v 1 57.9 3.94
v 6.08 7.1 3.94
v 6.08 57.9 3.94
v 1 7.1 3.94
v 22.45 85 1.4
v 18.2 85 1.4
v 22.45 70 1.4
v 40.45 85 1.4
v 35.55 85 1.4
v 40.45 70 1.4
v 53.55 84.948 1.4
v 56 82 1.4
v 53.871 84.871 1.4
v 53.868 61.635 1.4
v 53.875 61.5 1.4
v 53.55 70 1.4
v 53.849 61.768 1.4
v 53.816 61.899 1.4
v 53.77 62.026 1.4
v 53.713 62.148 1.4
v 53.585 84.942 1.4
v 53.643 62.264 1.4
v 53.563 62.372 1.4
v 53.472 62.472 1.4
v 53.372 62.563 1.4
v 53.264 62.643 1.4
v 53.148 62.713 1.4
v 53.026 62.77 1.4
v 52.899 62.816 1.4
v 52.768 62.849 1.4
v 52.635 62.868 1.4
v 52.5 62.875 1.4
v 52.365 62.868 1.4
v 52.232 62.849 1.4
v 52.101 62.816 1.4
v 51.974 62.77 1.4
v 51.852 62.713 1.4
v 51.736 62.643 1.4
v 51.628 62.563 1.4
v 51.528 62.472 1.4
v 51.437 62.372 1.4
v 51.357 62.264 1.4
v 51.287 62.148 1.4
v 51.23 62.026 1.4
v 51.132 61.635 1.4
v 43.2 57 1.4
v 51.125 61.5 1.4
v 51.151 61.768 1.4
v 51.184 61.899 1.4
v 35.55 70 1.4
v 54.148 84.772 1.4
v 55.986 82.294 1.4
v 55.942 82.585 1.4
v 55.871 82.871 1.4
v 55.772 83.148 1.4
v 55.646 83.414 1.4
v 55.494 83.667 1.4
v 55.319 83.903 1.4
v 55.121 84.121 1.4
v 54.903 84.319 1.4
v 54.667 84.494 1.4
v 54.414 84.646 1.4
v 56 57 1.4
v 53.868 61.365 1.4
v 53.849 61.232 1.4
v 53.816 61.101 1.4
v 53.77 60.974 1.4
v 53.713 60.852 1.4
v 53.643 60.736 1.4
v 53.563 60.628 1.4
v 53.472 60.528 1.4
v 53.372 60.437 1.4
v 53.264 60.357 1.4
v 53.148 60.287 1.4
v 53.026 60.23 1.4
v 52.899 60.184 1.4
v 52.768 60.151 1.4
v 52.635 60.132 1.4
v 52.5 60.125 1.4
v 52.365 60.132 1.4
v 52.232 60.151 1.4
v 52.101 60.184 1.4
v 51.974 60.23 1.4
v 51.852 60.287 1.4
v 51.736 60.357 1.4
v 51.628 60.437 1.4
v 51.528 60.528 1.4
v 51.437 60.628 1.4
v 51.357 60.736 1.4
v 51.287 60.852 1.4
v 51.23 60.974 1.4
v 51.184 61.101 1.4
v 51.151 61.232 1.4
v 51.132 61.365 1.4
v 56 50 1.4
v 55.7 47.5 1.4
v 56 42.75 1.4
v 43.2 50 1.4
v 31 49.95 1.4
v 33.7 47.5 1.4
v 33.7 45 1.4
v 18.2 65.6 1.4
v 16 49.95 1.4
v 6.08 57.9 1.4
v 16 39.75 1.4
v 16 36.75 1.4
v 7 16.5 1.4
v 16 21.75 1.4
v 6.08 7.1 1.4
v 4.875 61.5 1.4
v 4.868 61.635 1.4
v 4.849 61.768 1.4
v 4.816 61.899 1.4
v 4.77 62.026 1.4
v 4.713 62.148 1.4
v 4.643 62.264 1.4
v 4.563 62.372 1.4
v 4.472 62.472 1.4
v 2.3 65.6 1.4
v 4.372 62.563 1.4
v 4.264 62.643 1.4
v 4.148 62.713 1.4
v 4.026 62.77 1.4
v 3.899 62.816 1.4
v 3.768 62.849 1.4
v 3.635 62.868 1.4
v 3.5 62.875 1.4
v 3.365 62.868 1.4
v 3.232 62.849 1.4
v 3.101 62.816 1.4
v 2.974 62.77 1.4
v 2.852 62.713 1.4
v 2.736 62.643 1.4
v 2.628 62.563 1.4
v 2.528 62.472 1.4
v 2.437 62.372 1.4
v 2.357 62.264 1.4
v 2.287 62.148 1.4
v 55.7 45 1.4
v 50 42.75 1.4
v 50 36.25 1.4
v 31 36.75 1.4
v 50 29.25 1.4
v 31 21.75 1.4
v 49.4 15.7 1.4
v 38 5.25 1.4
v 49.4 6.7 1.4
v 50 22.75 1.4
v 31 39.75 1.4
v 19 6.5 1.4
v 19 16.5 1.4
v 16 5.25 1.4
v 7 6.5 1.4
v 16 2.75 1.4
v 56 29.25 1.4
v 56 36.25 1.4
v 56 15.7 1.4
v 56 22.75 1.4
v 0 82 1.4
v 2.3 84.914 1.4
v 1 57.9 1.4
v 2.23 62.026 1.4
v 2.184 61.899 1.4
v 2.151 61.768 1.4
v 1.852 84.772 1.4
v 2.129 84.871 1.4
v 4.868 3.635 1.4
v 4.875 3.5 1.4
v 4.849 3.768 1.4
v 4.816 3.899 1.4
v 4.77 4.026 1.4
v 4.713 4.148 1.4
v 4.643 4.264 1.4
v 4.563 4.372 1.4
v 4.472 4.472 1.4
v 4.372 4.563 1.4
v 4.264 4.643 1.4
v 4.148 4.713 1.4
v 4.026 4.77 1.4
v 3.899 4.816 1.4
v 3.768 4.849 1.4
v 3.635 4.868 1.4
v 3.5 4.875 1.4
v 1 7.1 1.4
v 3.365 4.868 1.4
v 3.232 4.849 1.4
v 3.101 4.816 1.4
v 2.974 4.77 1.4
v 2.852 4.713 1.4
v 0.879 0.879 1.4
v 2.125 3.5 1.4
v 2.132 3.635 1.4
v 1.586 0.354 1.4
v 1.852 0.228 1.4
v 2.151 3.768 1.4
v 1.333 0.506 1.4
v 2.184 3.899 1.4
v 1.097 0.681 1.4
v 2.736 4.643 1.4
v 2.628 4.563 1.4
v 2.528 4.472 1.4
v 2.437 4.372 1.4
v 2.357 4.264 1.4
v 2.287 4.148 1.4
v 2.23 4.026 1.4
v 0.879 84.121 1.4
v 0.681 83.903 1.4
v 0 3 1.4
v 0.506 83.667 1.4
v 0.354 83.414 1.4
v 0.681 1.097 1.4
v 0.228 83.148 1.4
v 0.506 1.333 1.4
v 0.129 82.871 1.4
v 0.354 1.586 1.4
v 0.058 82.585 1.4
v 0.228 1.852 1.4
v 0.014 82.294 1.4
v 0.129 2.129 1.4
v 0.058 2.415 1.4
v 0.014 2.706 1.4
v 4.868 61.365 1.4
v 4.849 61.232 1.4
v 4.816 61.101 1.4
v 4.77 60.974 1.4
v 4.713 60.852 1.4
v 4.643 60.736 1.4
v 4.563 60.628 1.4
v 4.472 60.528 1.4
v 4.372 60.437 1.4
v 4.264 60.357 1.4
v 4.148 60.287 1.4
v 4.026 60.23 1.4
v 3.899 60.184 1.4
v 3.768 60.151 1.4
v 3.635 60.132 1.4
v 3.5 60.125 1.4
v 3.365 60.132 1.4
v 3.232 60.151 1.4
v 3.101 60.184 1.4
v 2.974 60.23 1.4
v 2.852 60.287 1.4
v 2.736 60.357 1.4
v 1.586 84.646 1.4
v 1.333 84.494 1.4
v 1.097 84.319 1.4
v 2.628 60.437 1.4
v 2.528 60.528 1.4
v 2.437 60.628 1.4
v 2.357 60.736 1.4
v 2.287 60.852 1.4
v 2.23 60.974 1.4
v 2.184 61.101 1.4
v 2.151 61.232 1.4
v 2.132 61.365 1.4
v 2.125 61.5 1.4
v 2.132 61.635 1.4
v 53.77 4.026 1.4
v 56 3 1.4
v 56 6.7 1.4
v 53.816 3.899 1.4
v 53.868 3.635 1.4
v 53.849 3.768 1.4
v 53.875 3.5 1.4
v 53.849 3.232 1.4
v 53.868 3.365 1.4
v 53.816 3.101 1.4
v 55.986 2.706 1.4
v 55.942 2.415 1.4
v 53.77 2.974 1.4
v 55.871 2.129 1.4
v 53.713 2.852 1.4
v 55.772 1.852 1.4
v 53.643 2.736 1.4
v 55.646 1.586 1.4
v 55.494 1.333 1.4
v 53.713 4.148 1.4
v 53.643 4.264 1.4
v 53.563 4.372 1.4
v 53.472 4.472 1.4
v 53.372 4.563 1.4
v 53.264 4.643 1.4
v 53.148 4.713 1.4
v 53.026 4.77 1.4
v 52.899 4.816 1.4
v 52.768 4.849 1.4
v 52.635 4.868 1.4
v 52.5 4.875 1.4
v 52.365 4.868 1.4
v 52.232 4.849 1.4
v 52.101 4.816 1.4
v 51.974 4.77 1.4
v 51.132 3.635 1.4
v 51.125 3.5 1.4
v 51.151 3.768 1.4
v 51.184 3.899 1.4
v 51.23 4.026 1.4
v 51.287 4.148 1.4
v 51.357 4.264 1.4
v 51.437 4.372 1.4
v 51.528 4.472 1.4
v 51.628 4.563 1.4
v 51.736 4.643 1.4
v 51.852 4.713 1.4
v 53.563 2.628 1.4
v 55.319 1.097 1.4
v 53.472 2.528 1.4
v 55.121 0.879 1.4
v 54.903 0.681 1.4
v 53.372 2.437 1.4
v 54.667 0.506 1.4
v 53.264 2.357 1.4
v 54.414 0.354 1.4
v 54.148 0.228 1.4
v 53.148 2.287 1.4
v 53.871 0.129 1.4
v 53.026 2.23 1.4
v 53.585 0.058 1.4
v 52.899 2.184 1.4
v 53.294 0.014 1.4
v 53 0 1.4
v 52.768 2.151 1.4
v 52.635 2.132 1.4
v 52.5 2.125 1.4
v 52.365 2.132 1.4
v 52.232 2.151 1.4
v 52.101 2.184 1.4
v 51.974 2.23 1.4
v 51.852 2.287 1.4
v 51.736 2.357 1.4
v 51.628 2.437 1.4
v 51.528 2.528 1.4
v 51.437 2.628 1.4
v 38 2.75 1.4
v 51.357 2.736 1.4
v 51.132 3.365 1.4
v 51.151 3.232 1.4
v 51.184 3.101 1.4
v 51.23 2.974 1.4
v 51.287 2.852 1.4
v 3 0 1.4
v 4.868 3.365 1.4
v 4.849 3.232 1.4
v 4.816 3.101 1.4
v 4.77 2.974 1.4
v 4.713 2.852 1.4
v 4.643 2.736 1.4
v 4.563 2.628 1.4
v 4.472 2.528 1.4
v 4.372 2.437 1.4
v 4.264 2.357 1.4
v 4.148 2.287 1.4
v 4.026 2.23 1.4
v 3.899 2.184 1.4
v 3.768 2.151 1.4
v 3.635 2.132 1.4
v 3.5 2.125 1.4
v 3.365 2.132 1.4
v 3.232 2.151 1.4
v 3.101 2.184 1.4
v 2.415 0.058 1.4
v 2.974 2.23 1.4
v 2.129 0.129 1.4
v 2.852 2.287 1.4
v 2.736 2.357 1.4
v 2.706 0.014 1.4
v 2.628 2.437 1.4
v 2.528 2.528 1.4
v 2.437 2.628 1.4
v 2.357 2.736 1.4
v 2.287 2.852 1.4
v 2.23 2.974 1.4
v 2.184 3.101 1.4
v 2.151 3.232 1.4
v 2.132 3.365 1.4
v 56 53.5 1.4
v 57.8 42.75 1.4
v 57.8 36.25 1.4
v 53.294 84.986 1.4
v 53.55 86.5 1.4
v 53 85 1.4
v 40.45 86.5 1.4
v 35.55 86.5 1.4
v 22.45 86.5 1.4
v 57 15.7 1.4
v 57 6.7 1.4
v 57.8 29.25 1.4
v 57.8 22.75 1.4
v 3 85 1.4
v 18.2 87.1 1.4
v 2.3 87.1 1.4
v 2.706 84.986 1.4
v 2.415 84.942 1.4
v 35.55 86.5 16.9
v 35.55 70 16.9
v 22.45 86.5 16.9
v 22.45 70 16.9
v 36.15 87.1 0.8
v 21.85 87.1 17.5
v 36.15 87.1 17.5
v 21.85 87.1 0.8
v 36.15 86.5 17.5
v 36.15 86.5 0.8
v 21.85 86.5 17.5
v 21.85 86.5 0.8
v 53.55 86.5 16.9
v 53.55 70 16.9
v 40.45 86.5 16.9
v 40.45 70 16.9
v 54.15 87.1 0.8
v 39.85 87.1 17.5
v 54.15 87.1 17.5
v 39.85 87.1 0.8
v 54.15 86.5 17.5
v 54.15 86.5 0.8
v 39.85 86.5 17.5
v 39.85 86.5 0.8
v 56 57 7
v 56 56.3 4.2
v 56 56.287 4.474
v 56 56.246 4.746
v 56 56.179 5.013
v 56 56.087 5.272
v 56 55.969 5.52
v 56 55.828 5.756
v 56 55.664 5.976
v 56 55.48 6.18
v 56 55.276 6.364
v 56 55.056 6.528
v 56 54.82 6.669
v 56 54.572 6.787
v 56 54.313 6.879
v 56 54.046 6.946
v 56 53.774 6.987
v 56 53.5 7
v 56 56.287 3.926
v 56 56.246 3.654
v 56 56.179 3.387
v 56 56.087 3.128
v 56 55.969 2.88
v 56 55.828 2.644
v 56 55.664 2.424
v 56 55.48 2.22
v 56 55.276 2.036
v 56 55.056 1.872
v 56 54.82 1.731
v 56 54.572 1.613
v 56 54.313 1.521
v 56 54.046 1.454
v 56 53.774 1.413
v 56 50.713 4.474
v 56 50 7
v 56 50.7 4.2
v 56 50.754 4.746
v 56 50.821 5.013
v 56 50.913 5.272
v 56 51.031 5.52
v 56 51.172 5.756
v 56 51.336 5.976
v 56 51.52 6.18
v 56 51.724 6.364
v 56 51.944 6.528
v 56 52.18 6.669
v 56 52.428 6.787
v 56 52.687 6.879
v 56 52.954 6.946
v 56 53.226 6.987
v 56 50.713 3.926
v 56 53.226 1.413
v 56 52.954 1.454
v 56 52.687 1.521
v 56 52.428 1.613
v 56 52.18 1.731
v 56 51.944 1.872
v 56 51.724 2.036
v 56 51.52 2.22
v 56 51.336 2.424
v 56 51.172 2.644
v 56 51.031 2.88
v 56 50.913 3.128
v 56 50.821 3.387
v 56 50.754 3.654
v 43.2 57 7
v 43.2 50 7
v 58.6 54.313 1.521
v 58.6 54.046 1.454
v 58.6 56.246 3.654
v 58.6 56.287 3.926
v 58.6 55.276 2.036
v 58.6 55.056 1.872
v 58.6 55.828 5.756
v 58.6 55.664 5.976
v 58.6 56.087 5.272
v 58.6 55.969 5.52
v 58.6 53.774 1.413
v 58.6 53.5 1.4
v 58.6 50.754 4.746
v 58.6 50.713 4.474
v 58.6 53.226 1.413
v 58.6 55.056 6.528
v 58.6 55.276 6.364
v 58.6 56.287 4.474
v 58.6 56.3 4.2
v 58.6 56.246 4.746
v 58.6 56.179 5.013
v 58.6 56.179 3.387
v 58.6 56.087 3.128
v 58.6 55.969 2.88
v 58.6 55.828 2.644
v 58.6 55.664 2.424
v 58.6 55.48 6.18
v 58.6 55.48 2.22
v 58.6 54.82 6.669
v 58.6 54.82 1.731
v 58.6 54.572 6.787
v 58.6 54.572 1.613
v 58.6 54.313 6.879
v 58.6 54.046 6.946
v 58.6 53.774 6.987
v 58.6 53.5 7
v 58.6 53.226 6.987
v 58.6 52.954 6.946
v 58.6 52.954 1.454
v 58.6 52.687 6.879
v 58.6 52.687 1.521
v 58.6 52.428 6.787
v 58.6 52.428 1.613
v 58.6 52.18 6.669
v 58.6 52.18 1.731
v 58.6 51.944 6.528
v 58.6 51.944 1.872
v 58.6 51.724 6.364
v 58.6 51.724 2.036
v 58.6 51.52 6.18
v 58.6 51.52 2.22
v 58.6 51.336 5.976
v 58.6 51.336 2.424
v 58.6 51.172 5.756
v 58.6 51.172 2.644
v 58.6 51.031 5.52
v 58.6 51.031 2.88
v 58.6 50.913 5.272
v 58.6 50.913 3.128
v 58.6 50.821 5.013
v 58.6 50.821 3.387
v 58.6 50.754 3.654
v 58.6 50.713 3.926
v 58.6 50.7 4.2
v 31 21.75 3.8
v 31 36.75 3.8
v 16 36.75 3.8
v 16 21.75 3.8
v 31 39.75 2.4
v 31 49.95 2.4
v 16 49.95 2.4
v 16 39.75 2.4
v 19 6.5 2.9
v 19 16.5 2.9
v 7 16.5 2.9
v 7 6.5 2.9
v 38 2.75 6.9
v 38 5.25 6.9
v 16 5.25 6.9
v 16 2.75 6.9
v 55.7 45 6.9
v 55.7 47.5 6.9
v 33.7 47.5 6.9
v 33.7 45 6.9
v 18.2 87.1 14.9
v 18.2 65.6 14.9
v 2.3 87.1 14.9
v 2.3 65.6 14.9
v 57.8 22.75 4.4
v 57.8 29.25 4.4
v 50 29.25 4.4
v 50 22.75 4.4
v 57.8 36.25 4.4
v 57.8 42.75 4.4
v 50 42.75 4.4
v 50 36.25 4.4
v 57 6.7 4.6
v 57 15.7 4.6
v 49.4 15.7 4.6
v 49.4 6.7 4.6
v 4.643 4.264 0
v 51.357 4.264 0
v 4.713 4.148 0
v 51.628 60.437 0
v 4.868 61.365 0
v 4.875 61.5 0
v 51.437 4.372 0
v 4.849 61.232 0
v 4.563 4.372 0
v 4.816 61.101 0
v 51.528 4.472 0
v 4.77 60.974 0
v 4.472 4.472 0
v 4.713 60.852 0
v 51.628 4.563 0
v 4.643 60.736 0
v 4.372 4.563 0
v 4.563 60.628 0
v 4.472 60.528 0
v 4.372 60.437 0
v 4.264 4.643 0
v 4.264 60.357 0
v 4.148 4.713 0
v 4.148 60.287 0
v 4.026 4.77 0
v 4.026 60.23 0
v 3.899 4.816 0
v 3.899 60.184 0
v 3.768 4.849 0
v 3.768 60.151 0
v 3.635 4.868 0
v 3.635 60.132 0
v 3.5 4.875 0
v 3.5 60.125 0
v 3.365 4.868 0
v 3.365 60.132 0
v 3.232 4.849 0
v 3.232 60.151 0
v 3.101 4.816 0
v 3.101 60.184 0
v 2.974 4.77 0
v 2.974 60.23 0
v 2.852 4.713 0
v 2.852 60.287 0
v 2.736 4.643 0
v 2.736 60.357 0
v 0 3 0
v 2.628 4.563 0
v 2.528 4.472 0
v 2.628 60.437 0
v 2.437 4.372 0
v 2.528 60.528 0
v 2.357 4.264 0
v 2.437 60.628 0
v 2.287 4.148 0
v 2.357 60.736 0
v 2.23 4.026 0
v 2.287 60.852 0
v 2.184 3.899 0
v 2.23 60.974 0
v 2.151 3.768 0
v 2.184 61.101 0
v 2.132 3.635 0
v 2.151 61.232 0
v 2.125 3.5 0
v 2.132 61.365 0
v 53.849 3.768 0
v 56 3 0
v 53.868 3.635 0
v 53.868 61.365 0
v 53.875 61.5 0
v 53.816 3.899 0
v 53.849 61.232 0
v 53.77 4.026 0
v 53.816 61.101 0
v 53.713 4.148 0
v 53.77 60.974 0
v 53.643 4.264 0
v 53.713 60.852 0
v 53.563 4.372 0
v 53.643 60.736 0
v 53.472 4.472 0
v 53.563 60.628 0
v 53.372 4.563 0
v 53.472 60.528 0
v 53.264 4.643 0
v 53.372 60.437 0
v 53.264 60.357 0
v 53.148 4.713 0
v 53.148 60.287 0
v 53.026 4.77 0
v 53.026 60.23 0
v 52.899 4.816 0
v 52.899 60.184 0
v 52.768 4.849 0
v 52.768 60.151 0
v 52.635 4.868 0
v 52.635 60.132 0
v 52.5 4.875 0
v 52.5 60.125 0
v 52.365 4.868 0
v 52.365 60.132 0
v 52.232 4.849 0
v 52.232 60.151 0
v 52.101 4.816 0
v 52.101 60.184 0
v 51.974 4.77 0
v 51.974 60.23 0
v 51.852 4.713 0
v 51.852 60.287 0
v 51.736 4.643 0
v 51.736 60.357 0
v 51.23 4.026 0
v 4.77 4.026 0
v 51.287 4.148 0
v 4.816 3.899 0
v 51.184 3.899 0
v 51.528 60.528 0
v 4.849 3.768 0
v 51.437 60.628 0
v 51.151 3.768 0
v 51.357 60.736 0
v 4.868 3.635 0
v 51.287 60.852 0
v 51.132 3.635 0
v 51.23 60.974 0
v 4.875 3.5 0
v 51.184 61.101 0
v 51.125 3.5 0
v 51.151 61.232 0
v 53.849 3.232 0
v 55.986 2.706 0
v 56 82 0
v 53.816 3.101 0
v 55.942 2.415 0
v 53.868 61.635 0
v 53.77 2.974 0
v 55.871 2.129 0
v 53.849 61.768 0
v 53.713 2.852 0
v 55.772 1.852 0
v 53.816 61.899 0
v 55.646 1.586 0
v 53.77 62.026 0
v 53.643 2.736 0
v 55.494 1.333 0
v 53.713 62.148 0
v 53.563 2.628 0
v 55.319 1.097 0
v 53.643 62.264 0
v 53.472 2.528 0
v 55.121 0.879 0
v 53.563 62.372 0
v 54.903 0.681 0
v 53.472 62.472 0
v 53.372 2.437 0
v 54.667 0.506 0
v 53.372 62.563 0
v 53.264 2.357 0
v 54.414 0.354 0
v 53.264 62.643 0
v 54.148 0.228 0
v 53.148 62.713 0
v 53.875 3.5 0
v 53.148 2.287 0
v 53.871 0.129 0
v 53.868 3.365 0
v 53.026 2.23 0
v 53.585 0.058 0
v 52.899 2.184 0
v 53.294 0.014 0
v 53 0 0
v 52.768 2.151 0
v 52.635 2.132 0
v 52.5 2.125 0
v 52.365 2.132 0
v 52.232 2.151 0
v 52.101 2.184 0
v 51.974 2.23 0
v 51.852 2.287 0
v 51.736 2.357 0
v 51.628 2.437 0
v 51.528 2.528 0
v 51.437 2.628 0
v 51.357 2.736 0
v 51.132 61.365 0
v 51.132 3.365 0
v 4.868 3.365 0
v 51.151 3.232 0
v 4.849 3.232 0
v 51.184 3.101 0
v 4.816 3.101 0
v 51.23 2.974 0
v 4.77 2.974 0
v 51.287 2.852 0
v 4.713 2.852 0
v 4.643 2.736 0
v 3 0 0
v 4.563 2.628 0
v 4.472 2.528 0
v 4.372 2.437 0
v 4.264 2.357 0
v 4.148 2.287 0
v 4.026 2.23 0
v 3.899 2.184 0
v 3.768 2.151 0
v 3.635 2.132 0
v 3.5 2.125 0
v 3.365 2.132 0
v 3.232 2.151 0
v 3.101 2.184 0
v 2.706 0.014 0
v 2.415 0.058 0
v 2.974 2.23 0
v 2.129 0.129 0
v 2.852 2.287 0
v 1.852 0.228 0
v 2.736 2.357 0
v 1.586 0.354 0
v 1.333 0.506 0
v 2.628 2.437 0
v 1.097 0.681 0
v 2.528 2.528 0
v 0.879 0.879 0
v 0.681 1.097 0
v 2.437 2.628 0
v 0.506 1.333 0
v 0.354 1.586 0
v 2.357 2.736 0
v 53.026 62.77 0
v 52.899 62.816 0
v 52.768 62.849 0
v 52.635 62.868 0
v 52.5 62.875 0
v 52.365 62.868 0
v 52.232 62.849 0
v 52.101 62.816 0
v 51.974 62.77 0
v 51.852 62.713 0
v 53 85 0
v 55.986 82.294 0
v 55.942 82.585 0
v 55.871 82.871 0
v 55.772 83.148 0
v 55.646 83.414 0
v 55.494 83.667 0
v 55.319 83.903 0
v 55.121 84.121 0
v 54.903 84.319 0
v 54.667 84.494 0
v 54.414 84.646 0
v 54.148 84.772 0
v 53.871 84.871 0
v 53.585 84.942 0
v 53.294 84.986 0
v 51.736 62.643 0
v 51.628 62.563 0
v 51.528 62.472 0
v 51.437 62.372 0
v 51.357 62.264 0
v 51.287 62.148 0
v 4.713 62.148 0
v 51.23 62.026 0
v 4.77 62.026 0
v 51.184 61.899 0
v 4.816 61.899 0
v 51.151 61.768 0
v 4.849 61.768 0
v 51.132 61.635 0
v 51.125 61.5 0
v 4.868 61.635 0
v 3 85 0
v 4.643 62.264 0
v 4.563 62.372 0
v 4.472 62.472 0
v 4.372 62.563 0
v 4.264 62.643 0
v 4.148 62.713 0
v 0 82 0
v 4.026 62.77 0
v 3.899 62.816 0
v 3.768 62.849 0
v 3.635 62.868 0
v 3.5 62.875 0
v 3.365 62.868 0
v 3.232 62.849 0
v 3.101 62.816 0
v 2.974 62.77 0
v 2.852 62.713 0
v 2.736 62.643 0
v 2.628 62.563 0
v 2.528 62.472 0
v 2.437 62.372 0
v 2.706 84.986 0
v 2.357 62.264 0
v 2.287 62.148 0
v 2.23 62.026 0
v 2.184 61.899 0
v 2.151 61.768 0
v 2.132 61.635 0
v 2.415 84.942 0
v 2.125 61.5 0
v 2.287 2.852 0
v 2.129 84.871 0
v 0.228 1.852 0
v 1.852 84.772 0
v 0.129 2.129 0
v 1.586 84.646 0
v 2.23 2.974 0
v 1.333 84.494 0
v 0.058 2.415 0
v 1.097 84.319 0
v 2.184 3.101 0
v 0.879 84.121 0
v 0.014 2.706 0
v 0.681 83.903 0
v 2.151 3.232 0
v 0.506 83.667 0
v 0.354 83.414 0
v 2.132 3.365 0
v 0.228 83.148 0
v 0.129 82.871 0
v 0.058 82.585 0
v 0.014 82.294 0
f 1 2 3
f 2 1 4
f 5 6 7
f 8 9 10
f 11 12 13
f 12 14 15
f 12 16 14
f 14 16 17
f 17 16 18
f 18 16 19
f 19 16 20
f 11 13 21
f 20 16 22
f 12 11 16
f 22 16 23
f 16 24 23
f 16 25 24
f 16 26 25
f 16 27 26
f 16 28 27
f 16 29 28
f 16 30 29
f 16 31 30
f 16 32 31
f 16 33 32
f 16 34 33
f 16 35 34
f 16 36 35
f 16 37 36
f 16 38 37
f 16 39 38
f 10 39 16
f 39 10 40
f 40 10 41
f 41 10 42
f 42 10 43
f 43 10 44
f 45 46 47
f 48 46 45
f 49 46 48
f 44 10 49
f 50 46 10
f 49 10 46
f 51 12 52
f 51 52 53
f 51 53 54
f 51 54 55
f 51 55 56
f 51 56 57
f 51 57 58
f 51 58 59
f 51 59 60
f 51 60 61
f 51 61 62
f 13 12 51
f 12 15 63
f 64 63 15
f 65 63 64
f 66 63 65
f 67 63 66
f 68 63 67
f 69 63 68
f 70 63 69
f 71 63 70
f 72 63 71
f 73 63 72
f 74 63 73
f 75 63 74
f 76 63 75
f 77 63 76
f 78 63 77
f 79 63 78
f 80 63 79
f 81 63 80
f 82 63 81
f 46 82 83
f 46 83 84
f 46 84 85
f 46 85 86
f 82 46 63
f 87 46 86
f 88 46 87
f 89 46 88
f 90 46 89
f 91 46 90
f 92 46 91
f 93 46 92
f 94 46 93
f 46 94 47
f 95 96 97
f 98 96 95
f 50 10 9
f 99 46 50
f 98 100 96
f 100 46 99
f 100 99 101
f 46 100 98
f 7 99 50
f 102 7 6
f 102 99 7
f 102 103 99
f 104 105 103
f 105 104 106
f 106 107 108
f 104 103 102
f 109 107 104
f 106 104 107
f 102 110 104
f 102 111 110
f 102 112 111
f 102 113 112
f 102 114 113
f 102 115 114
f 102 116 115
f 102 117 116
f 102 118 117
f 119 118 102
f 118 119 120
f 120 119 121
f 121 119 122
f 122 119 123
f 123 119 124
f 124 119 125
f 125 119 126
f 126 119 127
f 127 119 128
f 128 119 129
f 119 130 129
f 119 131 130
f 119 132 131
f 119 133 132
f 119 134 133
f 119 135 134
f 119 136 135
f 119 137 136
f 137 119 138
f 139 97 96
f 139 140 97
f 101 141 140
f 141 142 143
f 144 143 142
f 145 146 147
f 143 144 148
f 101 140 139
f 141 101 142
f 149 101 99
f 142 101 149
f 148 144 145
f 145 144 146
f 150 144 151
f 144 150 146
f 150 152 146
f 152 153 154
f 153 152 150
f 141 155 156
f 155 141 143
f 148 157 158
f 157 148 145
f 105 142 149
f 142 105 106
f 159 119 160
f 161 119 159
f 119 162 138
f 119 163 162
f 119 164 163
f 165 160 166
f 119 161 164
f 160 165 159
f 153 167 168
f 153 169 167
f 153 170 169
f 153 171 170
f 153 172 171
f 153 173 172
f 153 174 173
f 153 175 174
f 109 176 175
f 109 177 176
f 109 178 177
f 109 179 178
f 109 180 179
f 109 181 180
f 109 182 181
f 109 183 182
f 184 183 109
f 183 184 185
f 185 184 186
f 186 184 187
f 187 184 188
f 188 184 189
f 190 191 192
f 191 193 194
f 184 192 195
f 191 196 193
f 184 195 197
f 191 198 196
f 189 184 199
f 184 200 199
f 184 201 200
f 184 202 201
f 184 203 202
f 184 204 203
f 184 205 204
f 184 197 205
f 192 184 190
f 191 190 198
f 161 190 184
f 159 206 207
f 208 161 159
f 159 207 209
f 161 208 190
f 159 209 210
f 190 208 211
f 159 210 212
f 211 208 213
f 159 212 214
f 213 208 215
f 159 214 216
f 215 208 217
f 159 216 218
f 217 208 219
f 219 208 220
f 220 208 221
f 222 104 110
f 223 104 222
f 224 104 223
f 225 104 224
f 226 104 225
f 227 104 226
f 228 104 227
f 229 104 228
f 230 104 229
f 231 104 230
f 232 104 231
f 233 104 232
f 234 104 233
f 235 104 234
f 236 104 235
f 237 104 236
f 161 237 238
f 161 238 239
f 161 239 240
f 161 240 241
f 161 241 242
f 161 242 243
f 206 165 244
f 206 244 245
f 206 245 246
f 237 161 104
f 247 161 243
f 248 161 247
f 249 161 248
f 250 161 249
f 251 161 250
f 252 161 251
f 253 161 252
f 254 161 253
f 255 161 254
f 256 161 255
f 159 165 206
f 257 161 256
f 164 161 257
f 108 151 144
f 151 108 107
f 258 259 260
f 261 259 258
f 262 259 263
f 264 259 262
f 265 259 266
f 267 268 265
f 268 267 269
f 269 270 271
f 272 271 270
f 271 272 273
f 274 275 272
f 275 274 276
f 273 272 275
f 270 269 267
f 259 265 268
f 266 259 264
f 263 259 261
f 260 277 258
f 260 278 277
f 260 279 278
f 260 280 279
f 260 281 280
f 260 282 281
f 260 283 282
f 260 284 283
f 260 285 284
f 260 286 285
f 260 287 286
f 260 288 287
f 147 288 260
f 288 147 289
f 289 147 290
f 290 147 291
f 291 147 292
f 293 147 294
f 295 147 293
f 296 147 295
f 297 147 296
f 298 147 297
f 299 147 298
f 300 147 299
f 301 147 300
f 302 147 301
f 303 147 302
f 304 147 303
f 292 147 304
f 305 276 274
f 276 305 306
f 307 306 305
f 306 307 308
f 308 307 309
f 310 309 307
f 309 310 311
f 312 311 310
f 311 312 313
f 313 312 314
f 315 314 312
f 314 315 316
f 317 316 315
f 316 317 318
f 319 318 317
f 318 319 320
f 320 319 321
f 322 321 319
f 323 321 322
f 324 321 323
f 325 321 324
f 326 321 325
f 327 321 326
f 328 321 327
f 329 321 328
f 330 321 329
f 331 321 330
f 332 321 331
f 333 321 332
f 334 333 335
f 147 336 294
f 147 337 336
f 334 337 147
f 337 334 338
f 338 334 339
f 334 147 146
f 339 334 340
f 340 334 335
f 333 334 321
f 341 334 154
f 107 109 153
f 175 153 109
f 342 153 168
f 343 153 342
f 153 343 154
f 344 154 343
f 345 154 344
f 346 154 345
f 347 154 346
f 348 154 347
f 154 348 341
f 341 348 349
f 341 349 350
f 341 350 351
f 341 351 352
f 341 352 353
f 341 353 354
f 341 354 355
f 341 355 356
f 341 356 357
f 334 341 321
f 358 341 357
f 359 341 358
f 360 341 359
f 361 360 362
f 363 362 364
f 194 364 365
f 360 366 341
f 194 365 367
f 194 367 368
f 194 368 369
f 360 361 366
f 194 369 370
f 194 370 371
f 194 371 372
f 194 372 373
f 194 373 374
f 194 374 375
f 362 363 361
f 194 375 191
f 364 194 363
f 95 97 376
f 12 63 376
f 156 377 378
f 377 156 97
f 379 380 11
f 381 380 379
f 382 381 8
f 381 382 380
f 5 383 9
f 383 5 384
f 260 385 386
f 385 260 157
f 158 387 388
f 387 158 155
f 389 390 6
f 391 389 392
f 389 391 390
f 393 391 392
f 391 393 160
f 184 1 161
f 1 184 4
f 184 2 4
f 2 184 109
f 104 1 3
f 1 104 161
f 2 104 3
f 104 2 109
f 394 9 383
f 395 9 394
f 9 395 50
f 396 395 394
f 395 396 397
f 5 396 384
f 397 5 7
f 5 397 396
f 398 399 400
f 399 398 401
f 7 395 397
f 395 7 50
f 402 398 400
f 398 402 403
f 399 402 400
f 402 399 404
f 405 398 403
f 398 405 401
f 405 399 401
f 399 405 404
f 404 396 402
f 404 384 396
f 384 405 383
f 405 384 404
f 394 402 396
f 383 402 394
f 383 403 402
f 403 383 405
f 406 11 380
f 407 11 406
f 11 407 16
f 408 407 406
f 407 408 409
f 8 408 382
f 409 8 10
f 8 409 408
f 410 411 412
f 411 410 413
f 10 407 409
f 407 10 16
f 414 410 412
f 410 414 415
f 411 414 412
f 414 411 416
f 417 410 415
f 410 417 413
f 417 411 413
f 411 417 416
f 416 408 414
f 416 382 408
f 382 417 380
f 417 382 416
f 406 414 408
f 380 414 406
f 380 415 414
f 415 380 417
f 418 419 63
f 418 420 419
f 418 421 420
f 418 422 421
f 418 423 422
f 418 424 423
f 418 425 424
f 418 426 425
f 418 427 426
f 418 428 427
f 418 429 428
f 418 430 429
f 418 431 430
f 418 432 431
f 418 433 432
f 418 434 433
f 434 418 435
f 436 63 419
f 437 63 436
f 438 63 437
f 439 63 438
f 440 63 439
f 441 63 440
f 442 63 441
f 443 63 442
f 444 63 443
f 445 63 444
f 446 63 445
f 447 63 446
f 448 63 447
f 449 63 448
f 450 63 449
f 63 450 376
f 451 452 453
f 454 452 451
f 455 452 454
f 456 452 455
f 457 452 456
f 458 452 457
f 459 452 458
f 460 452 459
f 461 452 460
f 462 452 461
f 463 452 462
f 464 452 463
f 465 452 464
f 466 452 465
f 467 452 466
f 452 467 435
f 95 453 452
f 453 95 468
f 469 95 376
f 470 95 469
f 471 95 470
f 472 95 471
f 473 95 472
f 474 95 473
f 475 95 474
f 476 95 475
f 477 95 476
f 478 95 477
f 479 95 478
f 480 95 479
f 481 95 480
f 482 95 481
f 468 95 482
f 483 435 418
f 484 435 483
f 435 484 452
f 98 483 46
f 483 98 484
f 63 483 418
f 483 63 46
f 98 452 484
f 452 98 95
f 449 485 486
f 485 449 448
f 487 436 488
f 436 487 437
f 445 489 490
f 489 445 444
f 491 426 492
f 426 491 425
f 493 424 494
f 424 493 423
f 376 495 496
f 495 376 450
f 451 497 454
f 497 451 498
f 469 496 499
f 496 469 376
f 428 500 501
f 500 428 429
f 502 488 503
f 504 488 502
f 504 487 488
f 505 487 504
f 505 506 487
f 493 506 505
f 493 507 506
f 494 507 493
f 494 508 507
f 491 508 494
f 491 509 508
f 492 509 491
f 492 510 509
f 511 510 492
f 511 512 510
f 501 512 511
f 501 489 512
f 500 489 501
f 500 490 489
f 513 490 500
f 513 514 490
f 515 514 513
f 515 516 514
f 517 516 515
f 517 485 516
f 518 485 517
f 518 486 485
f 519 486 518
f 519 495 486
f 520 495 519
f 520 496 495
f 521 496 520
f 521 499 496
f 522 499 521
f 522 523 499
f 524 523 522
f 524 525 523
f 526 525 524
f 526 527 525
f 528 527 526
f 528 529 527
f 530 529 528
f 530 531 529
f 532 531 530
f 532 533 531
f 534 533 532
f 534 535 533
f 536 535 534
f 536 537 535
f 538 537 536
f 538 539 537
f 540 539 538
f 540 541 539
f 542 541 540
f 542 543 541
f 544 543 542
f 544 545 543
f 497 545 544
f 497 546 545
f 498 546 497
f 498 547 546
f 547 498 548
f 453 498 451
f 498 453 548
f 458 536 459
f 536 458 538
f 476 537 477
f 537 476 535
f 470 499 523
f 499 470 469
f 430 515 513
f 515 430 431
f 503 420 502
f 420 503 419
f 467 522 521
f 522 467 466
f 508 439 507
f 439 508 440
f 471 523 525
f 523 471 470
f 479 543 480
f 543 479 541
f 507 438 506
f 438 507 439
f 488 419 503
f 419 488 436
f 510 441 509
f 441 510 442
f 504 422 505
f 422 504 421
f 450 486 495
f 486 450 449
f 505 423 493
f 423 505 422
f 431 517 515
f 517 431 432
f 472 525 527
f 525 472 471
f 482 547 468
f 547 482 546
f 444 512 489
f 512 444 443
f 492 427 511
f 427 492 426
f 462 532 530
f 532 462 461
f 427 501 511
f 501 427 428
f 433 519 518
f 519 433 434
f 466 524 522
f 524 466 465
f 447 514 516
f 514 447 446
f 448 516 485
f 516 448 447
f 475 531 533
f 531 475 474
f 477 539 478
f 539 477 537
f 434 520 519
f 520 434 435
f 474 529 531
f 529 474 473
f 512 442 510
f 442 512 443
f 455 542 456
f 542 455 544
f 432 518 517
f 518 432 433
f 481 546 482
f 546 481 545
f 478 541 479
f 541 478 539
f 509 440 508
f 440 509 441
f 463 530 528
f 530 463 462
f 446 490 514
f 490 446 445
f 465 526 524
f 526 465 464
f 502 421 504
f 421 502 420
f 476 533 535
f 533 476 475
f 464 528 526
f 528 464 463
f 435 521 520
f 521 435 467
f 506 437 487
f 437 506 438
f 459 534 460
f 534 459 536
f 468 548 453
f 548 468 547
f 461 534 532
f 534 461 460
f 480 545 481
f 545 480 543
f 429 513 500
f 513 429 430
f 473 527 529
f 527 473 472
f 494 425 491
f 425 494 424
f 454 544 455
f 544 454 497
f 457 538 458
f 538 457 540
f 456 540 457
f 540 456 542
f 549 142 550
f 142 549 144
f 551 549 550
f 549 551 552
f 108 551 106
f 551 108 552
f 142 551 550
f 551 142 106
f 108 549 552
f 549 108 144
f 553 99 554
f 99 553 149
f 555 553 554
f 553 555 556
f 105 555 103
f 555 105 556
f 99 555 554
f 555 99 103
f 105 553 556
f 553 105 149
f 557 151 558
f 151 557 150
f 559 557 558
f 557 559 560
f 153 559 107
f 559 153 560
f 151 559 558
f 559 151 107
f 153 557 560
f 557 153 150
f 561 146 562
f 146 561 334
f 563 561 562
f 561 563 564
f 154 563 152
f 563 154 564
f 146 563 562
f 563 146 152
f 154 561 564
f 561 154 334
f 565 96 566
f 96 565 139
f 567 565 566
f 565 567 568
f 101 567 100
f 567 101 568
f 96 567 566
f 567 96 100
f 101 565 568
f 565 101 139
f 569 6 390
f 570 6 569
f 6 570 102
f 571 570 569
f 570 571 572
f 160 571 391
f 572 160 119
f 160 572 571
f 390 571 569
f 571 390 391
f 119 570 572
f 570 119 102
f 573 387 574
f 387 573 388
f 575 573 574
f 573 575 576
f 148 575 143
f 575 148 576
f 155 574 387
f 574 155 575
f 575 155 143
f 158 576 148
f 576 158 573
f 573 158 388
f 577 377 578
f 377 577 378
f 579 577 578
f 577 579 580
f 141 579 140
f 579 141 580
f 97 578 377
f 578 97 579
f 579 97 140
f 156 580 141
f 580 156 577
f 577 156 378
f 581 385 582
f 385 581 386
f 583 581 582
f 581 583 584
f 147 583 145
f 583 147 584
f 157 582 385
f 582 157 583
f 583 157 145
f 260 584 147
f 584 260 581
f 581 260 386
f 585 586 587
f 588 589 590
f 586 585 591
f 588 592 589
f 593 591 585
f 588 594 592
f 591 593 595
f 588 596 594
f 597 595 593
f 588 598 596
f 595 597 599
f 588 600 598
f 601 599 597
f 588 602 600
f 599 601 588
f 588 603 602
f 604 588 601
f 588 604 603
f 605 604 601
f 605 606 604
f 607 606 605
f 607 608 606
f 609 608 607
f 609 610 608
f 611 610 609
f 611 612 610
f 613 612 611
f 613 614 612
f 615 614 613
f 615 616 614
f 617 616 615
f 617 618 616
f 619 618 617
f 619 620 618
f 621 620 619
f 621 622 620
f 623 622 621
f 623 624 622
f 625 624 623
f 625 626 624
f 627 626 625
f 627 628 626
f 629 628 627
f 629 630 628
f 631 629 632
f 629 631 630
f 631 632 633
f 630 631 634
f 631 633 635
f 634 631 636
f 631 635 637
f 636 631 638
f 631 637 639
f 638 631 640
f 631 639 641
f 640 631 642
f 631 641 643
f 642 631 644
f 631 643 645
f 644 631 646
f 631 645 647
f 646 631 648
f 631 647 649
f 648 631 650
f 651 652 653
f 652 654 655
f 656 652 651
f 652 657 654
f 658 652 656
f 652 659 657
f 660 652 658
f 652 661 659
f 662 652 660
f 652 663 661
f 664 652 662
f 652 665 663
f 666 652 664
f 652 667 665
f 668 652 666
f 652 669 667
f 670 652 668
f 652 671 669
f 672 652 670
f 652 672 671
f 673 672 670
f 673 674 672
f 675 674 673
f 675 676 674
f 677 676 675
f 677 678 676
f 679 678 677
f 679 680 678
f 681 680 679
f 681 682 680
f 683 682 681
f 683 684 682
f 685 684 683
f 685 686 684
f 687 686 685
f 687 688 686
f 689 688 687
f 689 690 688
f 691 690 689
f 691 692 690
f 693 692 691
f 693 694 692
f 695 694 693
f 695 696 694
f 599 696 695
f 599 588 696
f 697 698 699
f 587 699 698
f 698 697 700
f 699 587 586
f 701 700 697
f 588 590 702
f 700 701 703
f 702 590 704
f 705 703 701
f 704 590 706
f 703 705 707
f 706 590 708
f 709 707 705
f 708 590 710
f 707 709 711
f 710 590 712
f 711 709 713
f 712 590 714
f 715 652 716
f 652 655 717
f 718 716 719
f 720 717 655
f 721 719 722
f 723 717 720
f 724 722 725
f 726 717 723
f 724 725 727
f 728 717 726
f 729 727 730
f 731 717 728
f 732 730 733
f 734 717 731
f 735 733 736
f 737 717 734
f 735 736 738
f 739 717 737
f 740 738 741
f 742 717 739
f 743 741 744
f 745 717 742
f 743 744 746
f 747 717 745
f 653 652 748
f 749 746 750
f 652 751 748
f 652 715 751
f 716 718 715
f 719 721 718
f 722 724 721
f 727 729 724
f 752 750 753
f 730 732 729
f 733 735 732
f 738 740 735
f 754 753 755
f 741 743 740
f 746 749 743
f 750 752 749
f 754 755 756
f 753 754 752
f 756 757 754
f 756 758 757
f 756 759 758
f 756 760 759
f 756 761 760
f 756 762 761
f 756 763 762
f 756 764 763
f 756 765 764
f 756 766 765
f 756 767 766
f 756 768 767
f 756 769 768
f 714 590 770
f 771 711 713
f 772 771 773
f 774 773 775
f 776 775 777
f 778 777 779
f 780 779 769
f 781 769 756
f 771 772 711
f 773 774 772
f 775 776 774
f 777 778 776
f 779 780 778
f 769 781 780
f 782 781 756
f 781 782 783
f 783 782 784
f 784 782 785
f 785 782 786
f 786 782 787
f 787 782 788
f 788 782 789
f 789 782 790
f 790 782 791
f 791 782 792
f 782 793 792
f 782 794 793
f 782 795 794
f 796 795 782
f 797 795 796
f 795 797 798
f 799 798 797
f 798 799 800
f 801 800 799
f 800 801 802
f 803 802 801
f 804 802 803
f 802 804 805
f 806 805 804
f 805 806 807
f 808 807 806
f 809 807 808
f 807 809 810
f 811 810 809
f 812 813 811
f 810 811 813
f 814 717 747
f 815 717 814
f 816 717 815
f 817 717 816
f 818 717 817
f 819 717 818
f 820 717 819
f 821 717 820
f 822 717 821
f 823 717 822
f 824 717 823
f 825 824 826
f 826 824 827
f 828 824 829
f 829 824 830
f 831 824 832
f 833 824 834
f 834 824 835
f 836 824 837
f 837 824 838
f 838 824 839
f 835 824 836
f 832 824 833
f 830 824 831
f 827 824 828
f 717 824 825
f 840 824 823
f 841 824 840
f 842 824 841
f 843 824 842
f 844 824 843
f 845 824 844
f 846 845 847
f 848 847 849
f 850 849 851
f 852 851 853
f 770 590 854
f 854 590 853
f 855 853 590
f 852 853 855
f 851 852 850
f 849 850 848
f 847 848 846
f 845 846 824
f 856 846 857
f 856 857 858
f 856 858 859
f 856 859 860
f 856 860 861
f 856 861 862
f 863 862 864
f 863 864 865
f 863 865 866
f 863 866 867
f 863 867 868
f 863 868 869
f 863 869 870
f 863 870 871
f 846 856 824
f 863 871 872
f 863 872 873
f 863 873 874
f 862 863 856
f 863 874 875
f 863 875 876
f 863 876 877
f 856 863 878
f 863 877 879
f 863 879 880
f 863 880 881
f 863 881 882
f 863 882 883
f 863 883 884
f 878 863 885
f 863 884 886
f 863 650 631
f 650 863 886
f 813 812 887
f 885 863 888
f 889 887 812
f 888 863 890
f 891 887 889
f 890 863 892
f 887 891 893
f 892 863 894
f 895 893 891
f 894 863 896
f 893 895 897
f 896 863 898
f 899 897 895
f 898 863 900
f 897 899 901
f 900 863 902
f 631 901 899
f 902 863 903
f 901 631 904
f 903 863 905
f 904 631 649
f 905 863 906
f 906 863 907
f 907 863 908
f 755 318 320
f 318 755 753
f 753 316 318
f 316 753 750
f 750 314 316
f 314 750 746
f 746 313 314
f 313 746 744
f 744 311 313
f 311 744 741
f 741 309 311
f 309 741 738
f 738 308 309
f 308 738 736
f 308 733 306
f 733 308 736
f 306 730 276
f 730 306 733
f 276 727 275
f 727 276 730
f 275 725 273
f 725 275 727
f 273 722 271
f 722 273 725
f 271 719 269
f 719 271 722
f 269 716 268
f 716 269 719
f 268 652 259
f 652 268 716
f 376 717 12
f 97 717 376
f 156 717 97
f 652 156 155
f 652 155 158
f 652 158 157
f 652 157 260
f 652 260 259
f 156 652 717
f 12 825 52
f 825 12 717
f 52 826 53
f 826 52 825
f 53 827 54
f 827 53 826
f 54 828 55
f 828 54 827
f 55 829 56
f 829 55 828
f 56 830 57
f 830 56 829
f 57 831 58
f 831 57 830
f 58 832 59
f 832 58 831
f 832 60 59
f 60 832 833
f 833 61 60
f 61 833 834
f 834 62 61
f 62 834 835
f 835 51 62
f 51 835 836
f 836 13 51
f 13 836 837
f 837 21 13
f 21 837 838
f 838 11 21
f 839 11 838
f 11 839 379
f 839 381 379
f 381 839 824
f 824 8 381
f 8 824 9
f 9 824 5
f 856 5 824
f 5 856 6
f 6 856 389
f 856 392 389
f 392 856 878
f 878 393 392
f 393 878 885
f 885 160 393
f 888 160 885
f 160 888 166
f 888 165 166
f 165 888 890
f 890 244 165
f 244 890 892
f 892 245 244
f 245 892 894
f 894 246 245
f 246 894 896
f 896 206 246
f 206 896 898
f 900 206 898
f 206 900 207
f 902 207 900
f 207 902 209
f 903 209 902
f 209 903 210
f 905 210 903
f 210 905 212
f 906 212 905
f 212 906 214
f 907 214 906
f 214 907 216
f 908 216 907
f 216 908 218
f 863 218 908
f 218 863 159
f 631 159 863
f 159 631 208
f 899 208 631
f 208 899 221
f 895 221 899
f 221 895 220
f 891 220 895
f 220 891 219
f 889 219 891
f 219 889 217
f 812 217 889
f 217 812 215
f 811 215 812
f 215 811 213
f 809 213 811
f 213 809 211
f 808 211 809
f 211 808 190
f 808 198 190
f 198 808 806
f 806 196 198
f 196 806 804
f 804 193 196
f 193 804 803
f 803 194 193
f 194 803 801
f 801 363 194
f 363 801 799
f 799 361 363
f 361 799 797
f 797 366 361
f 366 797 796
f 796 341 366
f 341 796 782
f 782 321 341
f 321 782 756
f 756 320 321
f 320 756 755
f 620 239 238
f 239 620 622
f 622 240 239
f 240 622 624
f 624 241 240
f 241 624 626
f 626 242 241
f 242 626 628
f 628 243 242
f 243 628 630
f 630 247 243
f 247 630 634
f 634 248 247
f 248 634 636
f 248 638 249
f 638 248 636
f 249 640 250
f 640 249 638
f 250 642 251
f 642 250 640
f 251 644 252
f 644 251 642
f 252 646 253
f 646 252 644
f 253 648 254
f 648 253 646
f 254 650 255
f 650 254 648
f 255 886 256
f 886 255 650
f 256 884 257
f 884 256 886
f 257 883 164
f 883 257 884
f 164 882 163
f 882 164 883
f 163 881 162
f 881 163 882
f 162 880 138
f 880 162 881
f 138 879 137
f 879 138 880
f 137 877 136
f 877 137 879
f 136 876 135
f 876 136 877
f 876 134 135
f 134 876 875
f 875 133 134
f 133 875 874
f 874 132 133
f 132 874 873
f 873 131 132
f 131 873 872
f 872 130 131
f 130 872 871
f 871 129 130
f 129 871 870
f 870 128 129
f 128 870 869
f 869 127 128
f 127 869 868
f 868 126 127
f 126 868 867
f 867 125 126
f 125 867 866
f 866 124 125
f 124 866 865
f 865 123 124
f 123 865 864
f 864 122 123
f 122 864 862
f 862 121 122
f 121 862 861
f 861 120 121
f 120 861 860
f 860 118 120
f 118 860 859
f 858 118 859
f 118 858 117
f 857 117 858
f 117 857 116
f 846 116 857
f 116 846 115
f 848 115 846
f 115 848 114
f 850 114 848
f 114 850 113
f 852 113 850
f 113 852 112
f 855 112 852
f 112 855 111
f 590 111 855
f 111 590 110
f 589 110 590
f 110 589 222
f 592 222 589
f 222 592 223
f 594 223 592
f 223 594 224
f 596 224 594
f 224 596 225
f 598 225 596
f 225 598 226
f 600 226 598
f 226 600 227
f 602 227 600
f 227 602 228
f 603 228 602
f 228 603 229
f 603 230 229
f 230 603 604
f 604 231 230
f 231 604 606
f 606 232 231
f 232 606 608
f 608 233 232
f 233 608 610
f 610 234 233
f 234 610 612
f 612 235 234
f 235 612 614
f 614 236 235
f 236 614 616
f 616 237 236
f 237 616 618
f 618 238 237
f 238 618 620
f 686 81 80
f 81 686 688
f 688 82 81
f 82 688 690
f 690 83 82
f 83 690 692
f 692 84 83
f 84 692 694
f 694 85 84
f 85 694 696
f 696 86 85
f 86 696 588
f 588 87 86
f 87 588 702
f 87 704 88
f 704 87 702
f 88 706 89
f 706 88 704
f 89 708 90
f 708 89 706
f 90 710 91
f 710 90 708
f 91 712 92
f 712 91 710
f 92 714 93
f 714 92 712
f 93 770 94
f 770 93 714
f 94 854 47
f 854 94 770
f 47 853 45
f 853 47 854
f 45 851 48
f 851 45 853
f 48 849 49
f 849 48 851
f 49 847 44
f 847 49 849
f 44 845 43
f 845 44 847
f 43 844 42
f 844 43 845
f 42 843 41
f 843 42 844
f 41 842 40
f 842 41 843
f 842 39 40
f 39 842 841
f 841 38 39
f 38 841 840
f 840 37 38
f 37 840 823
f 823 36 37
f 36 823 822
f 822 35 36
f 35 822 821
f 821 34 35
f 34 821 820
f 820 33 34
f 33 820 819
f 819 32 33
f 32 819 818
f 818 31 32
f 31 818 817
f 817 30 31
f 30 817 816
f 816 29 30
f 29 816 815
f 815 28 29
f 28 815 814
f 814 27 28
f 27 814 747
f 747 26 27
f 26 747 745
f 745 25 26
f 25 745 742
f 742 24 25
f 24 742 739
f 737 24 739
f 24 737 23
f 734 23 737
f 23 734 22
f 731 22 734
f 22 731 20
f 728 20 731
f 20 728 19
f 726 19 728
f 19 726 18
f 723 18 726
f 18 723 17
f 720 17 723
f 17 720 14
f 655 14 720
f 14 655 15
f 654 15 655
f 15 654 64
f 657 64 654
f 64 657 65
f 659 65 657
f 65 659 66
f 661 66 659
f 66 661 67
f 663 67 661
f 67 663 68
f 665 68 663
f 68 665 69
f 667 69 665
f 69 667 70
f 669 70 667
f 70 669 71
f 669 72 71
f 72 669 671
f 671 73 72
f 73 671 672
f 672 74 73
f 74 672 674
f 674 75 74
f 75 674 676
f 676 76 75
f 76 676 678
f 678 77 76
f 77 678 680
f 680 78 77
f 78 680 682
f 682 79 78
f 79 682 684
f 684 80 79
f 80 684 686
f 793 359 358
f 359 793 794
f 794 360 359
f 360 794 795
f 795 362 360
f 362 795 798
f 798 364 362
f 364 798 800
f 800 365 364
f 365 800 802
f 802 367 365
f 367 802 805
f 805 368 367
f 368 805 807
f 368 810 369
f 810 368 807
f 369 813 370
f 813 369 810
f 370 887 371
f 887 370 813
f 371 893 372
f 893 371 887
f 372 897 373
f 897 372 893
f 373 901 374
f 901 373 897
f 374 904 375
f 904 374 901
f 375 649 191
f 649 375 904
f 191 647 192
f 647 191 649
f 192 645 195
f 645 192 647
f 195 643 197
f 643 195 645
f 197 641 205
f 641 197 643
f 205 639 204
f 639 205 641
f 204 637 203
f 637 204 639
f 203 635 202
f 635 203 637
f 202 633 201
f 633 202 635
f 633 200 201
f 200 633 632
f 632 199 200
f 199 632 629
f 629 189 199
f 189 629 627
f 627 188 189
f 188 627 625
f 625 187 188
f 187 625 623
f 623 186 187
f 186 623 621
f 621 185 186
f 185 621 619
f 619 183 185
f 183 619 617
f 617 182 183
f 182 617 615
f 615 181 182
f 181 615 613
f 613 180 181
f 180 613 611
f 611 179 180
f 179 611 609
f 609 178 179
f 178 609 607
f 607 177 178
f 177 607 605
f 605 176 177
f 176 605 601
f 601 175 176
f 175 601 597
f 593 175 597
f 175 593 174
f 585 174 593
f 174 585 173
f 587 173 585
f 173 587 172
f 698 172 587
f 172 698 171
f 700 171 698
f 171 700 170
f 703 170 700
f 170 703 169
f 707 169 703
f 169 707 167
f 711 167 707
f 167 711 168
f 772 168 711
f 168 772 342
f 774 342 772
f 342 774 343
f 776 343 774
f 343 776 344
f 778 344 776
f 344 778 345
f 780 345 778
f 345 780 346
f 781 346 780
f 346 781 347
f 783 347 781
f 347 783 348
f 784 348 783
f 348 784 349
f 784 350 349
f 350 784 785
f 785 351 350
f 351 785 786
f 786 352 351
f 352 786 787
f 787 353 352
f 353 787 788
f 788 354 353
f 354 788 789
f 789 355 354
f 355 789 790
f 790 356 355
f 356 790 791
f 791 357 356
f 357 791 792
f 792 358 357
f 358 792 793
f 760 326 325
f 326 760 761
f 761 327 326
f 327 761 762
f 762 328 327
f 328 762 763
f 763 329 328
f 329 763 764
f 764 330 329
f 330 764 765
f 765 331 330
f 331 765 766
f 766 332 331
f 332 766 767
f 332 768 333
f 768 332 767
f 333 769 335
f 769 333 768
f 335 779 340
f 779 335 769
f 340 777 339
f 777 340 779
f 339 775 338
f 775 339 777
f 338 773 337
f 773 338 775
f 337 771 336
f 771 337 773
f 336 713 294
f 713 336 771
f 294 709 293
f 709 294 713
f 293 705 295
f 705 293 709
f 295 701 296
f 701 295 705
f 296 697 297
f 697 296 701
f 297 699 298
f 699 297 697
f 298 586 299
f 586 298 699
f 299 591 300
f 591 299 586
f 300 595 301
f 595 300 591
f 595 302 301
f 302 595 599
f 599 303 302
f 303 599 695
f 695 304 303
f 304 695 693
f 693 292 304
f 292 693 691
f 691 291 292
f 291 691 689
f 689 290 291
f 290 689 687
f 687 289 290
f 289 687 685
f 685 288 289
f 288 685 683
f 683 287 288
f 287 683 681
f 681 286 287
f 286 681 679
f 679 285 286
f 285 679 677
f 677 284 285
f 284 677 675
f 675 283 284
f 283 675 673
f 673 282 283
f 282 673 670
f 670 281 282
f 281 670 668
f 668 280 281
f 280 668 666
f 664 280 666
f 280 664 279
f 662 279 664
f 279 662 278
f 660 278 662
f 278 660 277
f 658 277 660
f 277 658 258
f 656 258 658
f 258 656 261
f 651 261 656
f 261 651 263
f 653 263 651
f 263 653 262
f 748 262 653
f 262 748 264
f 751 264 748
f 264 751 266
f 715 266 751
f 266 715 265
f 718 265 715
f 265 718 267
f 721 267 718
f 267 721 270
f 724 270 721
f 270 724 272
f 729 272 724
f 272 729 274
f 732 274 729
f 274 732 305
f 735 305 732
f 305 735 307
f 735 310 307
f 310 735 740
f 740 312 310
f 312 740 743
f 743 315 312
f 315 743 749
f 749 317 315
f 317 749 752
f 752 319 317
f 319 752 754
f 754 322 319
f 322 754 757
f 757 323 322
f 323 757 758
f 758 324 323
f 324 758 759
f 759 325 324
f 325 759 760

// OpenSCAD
//------------------------------------------------------------------------
// OpenSCAD models of miscellaneous components and devices:
// various Raspberry Pi models, SainSmart Relays, PCD8544
// LCD, etc.
//
// Author:      Niccolo Rigacci <niccolo@rigacci.org>
// Version:     1.0 2017-12-14
// License:     GNU General Public License v3.0
// Modified:    by Richard Jelbert 5th January 2021 for RPi
// 4
//------------------------------------------------------------------------

// Interference for 3D union(), difference() and
// intersection(); used to avoid the manifold problem.
interf = 0.2;

//------------------------------------------------------------------------
// Matrix of 2.54 mm pins.
//------------------------------------------------------------------------
module pin_headers(cols, rows) {
  w = 2.54;
  h = 2.54;
  p = 0.65;
  for (x = [0:(cols - 1)]) {
    for (y = [0:(rows - 1)]) {
      translate([ w * x, w * y, 0 ]) {
        union() {
          color("black") cube([ w, w, h ]);
          // color("gold")  translate([(w - p) / 2, (w - p)
          // / 2, -3]) cube([p, p, 11.54]);
        }
      }
    }
  }
}

//------------------------------------------------------------------------
// Sub-models for the Raspberry Pi 4 Model
//------------------------------------------------------------------------

module ethernet_connector(x, y, z) { color("silver") cube([ x, y, z ]); }
module usb_connector(x, y, z) {
  f = 0.6; // Flange
  color("silver") cube([ x, y, z ]);
  translate([ -f, y - f, -f ]) color("silver")
    cube([ x + f * 2, f, z + f * 2 ]);
}
module hdmi_connector(x, y, z) { color("silver") cube([ x, y, z ]); }
module usbc_connector(x, y, z) { color("silver") cube([ x, y, z ]); }
module capacitor(d, h) { color("silver") cylinder(r = (d / 2), h = h); }
module micro_sd_card() {
  color("silver") translate([ 1.5, 0.0, -1.5 ]) cube([ 12, 12.5, 1.5 ]);
  color("orange") translate([ 2, -3.2, -1.0 ]) cube([ 11, 15, 1.0 ]);
}
module audio_video(size_x) {
  fn = 64;
  color([ 58 / 255, 58 / 255, 58 / 255 ]) {
    cube([ size_x, 7, 5.6 ]);
    translate([ size_x, 7 / 2, 5.6 / 2 ]) rotate([ 0, 90, 0 ])
      cylinder(d = 5.6, h = 2.6, $fn = fn);
  }
}
module cpu() { color("silver") cube([ 15, 15, 2.4 ]); }

module ram() { color("black") cube([ 15, 10.2, 1 ]); }

module wifi() { color("silver") cube([ 12, 10, 1.5 ]); }

module cameracon() { color("black") cube([ 22, 2.5, 5.5 ]); }

//------------------------------------------------------------------------
// Raspberry Pi 4 Model B
//------------------------------------------------------------------------
module rpi4_b() {
  fn = 64;
  x  = 56;
  y  = 85;
  z  = 1.40; // Measured PCB size
  ex = 15.9;
  ey = 21.5;
  ez = 13.5; // Ethernet port size
  ux = 13.1;
  uy = 17.1;
  uz = 15.5; // Measured USB connector size
  hx = 7.80;
  hy = 6.5;
  hz = 3; // Measured micro HDMI connector size
  mx = 7.60;
  my = 9;
  mz = 3.20; // Measured USB-C power connector size
  // The origin is the lower face of PCB.
  translate([ 0, 0, z ]) {
    translate([ 56 - 32.5 - 7.5, 3.5 + 25.75 - 7.5, 0 ]) cpu();
    translate([ 56 - 32.5 - 7.5, 3.5 + 43.75 - 7.5, 0 ]) ram();
    translate([ 7, 6.5, 0 ]) wifi();
    translate([ (56 / 2) - 12, (4 - 1.25), 0 ]) cameracon();
    translate([ (56) - 22.3, (45), 0 ]) cameracon();
    translate([ 1.0, 7.1, 0 ]) pin_headers(2, 20);
    translate([ x - (ex / 2) - 45.75, y - ey + 2.1, 0 ])
      ethernet_connector(ex, ey, ez);
    translate([ x - (ux / 2) - 27, 85 - uy + 2.1, 0 ])
      usb_connector(ux, uy, uz);
    translate([ x - (ux / 2) - 9, 85 - uy + 2.1, 0 ]) usb_connector(ux, uy, uz);
    translate([ x - hx + 1.8, (3.5 + 7.7 + 14.8 - (hy / 2)), 0 ])
      hdmi_connector(hx, hy, hz);
    translate([ x - hx + 1.8, (3.5 + 7.7 + 14.8 + 13.5 - (hy / 2)), 0 ])
      hdmi_connector(hx, hy, hz);
    translate([ x - 12.8, 50, 0 ]) audio_video(12.8);
    translate([ x - mx + 1, (3.5 + 7.7 - (my / 2)), 0 ])
      usbc_connector(mx, my, mz);
    // translate([20.5, 0.8, -z])  micro_sd_card();
    translate([ 0, 0, -z ]) {
      color("green") linear_extrude(height = z) difference() {
        hull() {
          translate([ 3, 3 ]) circle(r = 3, $fn = fn);
          translate([ x - 3, 3 ]) circle(r = 3, $fn = fn);
          translate([ x - 3, y - 3 ]) circle(r = 3, $fn = fn);
          translate([ 3, y - 3 ]) circle(r = 3, $fn = fn);
        }
        rpi4_b_holes();
      }
    }
  }
}

//------------------------------------------------------------------------
// Holes for Raspberry Pi 4 Model B
//------------------------------------------------------------------------
module rpi4_b_holes() {
  x  = 56;
  fn = 64;
  translate([ 3.5, 3.5 ]) circle(r = (2.75 / 2), $fn = fn);
  translate([ (x - 3.5), 3.5 ]) circle(r = (2.75 / 2), $fn = fn);
  translate([ 3.5, 3.5 + 58 ]) circle(r = (2.75 / 2), $fn = fn);
  translate([ (x - 3.5), 3.5 + 58 ]) circle(r = (2.75 / 2), $fn = fn);
}

rpi4_b();
